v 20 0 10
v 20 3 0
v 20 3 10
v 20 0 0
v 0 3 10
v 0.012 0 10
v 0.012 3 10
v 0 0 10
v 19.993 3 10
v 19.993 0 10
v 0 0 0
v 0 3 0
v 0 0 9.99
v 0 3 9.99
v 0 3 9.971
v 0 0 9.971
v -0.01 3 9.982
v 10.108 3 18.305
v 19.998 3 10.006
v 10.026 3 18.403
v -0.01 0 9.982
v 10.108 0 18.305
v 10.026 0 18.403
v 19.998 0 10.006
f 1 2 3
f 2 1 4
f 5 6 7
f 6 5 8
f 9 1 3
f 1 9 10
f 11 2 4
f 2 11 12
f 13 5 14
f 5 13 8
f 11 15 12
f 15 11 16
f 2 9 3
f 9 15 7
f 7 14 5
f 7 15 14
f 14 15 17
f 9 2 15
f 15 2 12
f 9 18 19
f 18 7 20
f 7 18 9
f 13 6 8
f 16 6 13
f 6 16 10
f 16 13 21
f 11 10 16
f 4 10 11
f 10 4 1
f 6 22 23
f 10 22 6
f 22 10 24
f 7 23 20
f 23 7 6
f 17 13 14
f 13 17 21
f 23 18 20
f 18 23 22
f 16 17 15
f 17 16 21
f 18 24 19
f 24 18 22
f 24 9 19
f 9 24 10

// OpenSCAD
//Question 5   
color("#67B7D1"){
    cube([20, 3, 10]);
    translate([4.49, 0,4.62])
        rotate([0, -40, 0])
        cube([13.1, 3, 7]);    
    
    translate([5.54, 0,13])
        rotate([0, 40, 0])
        cube([13, 3, 7]);  
}
